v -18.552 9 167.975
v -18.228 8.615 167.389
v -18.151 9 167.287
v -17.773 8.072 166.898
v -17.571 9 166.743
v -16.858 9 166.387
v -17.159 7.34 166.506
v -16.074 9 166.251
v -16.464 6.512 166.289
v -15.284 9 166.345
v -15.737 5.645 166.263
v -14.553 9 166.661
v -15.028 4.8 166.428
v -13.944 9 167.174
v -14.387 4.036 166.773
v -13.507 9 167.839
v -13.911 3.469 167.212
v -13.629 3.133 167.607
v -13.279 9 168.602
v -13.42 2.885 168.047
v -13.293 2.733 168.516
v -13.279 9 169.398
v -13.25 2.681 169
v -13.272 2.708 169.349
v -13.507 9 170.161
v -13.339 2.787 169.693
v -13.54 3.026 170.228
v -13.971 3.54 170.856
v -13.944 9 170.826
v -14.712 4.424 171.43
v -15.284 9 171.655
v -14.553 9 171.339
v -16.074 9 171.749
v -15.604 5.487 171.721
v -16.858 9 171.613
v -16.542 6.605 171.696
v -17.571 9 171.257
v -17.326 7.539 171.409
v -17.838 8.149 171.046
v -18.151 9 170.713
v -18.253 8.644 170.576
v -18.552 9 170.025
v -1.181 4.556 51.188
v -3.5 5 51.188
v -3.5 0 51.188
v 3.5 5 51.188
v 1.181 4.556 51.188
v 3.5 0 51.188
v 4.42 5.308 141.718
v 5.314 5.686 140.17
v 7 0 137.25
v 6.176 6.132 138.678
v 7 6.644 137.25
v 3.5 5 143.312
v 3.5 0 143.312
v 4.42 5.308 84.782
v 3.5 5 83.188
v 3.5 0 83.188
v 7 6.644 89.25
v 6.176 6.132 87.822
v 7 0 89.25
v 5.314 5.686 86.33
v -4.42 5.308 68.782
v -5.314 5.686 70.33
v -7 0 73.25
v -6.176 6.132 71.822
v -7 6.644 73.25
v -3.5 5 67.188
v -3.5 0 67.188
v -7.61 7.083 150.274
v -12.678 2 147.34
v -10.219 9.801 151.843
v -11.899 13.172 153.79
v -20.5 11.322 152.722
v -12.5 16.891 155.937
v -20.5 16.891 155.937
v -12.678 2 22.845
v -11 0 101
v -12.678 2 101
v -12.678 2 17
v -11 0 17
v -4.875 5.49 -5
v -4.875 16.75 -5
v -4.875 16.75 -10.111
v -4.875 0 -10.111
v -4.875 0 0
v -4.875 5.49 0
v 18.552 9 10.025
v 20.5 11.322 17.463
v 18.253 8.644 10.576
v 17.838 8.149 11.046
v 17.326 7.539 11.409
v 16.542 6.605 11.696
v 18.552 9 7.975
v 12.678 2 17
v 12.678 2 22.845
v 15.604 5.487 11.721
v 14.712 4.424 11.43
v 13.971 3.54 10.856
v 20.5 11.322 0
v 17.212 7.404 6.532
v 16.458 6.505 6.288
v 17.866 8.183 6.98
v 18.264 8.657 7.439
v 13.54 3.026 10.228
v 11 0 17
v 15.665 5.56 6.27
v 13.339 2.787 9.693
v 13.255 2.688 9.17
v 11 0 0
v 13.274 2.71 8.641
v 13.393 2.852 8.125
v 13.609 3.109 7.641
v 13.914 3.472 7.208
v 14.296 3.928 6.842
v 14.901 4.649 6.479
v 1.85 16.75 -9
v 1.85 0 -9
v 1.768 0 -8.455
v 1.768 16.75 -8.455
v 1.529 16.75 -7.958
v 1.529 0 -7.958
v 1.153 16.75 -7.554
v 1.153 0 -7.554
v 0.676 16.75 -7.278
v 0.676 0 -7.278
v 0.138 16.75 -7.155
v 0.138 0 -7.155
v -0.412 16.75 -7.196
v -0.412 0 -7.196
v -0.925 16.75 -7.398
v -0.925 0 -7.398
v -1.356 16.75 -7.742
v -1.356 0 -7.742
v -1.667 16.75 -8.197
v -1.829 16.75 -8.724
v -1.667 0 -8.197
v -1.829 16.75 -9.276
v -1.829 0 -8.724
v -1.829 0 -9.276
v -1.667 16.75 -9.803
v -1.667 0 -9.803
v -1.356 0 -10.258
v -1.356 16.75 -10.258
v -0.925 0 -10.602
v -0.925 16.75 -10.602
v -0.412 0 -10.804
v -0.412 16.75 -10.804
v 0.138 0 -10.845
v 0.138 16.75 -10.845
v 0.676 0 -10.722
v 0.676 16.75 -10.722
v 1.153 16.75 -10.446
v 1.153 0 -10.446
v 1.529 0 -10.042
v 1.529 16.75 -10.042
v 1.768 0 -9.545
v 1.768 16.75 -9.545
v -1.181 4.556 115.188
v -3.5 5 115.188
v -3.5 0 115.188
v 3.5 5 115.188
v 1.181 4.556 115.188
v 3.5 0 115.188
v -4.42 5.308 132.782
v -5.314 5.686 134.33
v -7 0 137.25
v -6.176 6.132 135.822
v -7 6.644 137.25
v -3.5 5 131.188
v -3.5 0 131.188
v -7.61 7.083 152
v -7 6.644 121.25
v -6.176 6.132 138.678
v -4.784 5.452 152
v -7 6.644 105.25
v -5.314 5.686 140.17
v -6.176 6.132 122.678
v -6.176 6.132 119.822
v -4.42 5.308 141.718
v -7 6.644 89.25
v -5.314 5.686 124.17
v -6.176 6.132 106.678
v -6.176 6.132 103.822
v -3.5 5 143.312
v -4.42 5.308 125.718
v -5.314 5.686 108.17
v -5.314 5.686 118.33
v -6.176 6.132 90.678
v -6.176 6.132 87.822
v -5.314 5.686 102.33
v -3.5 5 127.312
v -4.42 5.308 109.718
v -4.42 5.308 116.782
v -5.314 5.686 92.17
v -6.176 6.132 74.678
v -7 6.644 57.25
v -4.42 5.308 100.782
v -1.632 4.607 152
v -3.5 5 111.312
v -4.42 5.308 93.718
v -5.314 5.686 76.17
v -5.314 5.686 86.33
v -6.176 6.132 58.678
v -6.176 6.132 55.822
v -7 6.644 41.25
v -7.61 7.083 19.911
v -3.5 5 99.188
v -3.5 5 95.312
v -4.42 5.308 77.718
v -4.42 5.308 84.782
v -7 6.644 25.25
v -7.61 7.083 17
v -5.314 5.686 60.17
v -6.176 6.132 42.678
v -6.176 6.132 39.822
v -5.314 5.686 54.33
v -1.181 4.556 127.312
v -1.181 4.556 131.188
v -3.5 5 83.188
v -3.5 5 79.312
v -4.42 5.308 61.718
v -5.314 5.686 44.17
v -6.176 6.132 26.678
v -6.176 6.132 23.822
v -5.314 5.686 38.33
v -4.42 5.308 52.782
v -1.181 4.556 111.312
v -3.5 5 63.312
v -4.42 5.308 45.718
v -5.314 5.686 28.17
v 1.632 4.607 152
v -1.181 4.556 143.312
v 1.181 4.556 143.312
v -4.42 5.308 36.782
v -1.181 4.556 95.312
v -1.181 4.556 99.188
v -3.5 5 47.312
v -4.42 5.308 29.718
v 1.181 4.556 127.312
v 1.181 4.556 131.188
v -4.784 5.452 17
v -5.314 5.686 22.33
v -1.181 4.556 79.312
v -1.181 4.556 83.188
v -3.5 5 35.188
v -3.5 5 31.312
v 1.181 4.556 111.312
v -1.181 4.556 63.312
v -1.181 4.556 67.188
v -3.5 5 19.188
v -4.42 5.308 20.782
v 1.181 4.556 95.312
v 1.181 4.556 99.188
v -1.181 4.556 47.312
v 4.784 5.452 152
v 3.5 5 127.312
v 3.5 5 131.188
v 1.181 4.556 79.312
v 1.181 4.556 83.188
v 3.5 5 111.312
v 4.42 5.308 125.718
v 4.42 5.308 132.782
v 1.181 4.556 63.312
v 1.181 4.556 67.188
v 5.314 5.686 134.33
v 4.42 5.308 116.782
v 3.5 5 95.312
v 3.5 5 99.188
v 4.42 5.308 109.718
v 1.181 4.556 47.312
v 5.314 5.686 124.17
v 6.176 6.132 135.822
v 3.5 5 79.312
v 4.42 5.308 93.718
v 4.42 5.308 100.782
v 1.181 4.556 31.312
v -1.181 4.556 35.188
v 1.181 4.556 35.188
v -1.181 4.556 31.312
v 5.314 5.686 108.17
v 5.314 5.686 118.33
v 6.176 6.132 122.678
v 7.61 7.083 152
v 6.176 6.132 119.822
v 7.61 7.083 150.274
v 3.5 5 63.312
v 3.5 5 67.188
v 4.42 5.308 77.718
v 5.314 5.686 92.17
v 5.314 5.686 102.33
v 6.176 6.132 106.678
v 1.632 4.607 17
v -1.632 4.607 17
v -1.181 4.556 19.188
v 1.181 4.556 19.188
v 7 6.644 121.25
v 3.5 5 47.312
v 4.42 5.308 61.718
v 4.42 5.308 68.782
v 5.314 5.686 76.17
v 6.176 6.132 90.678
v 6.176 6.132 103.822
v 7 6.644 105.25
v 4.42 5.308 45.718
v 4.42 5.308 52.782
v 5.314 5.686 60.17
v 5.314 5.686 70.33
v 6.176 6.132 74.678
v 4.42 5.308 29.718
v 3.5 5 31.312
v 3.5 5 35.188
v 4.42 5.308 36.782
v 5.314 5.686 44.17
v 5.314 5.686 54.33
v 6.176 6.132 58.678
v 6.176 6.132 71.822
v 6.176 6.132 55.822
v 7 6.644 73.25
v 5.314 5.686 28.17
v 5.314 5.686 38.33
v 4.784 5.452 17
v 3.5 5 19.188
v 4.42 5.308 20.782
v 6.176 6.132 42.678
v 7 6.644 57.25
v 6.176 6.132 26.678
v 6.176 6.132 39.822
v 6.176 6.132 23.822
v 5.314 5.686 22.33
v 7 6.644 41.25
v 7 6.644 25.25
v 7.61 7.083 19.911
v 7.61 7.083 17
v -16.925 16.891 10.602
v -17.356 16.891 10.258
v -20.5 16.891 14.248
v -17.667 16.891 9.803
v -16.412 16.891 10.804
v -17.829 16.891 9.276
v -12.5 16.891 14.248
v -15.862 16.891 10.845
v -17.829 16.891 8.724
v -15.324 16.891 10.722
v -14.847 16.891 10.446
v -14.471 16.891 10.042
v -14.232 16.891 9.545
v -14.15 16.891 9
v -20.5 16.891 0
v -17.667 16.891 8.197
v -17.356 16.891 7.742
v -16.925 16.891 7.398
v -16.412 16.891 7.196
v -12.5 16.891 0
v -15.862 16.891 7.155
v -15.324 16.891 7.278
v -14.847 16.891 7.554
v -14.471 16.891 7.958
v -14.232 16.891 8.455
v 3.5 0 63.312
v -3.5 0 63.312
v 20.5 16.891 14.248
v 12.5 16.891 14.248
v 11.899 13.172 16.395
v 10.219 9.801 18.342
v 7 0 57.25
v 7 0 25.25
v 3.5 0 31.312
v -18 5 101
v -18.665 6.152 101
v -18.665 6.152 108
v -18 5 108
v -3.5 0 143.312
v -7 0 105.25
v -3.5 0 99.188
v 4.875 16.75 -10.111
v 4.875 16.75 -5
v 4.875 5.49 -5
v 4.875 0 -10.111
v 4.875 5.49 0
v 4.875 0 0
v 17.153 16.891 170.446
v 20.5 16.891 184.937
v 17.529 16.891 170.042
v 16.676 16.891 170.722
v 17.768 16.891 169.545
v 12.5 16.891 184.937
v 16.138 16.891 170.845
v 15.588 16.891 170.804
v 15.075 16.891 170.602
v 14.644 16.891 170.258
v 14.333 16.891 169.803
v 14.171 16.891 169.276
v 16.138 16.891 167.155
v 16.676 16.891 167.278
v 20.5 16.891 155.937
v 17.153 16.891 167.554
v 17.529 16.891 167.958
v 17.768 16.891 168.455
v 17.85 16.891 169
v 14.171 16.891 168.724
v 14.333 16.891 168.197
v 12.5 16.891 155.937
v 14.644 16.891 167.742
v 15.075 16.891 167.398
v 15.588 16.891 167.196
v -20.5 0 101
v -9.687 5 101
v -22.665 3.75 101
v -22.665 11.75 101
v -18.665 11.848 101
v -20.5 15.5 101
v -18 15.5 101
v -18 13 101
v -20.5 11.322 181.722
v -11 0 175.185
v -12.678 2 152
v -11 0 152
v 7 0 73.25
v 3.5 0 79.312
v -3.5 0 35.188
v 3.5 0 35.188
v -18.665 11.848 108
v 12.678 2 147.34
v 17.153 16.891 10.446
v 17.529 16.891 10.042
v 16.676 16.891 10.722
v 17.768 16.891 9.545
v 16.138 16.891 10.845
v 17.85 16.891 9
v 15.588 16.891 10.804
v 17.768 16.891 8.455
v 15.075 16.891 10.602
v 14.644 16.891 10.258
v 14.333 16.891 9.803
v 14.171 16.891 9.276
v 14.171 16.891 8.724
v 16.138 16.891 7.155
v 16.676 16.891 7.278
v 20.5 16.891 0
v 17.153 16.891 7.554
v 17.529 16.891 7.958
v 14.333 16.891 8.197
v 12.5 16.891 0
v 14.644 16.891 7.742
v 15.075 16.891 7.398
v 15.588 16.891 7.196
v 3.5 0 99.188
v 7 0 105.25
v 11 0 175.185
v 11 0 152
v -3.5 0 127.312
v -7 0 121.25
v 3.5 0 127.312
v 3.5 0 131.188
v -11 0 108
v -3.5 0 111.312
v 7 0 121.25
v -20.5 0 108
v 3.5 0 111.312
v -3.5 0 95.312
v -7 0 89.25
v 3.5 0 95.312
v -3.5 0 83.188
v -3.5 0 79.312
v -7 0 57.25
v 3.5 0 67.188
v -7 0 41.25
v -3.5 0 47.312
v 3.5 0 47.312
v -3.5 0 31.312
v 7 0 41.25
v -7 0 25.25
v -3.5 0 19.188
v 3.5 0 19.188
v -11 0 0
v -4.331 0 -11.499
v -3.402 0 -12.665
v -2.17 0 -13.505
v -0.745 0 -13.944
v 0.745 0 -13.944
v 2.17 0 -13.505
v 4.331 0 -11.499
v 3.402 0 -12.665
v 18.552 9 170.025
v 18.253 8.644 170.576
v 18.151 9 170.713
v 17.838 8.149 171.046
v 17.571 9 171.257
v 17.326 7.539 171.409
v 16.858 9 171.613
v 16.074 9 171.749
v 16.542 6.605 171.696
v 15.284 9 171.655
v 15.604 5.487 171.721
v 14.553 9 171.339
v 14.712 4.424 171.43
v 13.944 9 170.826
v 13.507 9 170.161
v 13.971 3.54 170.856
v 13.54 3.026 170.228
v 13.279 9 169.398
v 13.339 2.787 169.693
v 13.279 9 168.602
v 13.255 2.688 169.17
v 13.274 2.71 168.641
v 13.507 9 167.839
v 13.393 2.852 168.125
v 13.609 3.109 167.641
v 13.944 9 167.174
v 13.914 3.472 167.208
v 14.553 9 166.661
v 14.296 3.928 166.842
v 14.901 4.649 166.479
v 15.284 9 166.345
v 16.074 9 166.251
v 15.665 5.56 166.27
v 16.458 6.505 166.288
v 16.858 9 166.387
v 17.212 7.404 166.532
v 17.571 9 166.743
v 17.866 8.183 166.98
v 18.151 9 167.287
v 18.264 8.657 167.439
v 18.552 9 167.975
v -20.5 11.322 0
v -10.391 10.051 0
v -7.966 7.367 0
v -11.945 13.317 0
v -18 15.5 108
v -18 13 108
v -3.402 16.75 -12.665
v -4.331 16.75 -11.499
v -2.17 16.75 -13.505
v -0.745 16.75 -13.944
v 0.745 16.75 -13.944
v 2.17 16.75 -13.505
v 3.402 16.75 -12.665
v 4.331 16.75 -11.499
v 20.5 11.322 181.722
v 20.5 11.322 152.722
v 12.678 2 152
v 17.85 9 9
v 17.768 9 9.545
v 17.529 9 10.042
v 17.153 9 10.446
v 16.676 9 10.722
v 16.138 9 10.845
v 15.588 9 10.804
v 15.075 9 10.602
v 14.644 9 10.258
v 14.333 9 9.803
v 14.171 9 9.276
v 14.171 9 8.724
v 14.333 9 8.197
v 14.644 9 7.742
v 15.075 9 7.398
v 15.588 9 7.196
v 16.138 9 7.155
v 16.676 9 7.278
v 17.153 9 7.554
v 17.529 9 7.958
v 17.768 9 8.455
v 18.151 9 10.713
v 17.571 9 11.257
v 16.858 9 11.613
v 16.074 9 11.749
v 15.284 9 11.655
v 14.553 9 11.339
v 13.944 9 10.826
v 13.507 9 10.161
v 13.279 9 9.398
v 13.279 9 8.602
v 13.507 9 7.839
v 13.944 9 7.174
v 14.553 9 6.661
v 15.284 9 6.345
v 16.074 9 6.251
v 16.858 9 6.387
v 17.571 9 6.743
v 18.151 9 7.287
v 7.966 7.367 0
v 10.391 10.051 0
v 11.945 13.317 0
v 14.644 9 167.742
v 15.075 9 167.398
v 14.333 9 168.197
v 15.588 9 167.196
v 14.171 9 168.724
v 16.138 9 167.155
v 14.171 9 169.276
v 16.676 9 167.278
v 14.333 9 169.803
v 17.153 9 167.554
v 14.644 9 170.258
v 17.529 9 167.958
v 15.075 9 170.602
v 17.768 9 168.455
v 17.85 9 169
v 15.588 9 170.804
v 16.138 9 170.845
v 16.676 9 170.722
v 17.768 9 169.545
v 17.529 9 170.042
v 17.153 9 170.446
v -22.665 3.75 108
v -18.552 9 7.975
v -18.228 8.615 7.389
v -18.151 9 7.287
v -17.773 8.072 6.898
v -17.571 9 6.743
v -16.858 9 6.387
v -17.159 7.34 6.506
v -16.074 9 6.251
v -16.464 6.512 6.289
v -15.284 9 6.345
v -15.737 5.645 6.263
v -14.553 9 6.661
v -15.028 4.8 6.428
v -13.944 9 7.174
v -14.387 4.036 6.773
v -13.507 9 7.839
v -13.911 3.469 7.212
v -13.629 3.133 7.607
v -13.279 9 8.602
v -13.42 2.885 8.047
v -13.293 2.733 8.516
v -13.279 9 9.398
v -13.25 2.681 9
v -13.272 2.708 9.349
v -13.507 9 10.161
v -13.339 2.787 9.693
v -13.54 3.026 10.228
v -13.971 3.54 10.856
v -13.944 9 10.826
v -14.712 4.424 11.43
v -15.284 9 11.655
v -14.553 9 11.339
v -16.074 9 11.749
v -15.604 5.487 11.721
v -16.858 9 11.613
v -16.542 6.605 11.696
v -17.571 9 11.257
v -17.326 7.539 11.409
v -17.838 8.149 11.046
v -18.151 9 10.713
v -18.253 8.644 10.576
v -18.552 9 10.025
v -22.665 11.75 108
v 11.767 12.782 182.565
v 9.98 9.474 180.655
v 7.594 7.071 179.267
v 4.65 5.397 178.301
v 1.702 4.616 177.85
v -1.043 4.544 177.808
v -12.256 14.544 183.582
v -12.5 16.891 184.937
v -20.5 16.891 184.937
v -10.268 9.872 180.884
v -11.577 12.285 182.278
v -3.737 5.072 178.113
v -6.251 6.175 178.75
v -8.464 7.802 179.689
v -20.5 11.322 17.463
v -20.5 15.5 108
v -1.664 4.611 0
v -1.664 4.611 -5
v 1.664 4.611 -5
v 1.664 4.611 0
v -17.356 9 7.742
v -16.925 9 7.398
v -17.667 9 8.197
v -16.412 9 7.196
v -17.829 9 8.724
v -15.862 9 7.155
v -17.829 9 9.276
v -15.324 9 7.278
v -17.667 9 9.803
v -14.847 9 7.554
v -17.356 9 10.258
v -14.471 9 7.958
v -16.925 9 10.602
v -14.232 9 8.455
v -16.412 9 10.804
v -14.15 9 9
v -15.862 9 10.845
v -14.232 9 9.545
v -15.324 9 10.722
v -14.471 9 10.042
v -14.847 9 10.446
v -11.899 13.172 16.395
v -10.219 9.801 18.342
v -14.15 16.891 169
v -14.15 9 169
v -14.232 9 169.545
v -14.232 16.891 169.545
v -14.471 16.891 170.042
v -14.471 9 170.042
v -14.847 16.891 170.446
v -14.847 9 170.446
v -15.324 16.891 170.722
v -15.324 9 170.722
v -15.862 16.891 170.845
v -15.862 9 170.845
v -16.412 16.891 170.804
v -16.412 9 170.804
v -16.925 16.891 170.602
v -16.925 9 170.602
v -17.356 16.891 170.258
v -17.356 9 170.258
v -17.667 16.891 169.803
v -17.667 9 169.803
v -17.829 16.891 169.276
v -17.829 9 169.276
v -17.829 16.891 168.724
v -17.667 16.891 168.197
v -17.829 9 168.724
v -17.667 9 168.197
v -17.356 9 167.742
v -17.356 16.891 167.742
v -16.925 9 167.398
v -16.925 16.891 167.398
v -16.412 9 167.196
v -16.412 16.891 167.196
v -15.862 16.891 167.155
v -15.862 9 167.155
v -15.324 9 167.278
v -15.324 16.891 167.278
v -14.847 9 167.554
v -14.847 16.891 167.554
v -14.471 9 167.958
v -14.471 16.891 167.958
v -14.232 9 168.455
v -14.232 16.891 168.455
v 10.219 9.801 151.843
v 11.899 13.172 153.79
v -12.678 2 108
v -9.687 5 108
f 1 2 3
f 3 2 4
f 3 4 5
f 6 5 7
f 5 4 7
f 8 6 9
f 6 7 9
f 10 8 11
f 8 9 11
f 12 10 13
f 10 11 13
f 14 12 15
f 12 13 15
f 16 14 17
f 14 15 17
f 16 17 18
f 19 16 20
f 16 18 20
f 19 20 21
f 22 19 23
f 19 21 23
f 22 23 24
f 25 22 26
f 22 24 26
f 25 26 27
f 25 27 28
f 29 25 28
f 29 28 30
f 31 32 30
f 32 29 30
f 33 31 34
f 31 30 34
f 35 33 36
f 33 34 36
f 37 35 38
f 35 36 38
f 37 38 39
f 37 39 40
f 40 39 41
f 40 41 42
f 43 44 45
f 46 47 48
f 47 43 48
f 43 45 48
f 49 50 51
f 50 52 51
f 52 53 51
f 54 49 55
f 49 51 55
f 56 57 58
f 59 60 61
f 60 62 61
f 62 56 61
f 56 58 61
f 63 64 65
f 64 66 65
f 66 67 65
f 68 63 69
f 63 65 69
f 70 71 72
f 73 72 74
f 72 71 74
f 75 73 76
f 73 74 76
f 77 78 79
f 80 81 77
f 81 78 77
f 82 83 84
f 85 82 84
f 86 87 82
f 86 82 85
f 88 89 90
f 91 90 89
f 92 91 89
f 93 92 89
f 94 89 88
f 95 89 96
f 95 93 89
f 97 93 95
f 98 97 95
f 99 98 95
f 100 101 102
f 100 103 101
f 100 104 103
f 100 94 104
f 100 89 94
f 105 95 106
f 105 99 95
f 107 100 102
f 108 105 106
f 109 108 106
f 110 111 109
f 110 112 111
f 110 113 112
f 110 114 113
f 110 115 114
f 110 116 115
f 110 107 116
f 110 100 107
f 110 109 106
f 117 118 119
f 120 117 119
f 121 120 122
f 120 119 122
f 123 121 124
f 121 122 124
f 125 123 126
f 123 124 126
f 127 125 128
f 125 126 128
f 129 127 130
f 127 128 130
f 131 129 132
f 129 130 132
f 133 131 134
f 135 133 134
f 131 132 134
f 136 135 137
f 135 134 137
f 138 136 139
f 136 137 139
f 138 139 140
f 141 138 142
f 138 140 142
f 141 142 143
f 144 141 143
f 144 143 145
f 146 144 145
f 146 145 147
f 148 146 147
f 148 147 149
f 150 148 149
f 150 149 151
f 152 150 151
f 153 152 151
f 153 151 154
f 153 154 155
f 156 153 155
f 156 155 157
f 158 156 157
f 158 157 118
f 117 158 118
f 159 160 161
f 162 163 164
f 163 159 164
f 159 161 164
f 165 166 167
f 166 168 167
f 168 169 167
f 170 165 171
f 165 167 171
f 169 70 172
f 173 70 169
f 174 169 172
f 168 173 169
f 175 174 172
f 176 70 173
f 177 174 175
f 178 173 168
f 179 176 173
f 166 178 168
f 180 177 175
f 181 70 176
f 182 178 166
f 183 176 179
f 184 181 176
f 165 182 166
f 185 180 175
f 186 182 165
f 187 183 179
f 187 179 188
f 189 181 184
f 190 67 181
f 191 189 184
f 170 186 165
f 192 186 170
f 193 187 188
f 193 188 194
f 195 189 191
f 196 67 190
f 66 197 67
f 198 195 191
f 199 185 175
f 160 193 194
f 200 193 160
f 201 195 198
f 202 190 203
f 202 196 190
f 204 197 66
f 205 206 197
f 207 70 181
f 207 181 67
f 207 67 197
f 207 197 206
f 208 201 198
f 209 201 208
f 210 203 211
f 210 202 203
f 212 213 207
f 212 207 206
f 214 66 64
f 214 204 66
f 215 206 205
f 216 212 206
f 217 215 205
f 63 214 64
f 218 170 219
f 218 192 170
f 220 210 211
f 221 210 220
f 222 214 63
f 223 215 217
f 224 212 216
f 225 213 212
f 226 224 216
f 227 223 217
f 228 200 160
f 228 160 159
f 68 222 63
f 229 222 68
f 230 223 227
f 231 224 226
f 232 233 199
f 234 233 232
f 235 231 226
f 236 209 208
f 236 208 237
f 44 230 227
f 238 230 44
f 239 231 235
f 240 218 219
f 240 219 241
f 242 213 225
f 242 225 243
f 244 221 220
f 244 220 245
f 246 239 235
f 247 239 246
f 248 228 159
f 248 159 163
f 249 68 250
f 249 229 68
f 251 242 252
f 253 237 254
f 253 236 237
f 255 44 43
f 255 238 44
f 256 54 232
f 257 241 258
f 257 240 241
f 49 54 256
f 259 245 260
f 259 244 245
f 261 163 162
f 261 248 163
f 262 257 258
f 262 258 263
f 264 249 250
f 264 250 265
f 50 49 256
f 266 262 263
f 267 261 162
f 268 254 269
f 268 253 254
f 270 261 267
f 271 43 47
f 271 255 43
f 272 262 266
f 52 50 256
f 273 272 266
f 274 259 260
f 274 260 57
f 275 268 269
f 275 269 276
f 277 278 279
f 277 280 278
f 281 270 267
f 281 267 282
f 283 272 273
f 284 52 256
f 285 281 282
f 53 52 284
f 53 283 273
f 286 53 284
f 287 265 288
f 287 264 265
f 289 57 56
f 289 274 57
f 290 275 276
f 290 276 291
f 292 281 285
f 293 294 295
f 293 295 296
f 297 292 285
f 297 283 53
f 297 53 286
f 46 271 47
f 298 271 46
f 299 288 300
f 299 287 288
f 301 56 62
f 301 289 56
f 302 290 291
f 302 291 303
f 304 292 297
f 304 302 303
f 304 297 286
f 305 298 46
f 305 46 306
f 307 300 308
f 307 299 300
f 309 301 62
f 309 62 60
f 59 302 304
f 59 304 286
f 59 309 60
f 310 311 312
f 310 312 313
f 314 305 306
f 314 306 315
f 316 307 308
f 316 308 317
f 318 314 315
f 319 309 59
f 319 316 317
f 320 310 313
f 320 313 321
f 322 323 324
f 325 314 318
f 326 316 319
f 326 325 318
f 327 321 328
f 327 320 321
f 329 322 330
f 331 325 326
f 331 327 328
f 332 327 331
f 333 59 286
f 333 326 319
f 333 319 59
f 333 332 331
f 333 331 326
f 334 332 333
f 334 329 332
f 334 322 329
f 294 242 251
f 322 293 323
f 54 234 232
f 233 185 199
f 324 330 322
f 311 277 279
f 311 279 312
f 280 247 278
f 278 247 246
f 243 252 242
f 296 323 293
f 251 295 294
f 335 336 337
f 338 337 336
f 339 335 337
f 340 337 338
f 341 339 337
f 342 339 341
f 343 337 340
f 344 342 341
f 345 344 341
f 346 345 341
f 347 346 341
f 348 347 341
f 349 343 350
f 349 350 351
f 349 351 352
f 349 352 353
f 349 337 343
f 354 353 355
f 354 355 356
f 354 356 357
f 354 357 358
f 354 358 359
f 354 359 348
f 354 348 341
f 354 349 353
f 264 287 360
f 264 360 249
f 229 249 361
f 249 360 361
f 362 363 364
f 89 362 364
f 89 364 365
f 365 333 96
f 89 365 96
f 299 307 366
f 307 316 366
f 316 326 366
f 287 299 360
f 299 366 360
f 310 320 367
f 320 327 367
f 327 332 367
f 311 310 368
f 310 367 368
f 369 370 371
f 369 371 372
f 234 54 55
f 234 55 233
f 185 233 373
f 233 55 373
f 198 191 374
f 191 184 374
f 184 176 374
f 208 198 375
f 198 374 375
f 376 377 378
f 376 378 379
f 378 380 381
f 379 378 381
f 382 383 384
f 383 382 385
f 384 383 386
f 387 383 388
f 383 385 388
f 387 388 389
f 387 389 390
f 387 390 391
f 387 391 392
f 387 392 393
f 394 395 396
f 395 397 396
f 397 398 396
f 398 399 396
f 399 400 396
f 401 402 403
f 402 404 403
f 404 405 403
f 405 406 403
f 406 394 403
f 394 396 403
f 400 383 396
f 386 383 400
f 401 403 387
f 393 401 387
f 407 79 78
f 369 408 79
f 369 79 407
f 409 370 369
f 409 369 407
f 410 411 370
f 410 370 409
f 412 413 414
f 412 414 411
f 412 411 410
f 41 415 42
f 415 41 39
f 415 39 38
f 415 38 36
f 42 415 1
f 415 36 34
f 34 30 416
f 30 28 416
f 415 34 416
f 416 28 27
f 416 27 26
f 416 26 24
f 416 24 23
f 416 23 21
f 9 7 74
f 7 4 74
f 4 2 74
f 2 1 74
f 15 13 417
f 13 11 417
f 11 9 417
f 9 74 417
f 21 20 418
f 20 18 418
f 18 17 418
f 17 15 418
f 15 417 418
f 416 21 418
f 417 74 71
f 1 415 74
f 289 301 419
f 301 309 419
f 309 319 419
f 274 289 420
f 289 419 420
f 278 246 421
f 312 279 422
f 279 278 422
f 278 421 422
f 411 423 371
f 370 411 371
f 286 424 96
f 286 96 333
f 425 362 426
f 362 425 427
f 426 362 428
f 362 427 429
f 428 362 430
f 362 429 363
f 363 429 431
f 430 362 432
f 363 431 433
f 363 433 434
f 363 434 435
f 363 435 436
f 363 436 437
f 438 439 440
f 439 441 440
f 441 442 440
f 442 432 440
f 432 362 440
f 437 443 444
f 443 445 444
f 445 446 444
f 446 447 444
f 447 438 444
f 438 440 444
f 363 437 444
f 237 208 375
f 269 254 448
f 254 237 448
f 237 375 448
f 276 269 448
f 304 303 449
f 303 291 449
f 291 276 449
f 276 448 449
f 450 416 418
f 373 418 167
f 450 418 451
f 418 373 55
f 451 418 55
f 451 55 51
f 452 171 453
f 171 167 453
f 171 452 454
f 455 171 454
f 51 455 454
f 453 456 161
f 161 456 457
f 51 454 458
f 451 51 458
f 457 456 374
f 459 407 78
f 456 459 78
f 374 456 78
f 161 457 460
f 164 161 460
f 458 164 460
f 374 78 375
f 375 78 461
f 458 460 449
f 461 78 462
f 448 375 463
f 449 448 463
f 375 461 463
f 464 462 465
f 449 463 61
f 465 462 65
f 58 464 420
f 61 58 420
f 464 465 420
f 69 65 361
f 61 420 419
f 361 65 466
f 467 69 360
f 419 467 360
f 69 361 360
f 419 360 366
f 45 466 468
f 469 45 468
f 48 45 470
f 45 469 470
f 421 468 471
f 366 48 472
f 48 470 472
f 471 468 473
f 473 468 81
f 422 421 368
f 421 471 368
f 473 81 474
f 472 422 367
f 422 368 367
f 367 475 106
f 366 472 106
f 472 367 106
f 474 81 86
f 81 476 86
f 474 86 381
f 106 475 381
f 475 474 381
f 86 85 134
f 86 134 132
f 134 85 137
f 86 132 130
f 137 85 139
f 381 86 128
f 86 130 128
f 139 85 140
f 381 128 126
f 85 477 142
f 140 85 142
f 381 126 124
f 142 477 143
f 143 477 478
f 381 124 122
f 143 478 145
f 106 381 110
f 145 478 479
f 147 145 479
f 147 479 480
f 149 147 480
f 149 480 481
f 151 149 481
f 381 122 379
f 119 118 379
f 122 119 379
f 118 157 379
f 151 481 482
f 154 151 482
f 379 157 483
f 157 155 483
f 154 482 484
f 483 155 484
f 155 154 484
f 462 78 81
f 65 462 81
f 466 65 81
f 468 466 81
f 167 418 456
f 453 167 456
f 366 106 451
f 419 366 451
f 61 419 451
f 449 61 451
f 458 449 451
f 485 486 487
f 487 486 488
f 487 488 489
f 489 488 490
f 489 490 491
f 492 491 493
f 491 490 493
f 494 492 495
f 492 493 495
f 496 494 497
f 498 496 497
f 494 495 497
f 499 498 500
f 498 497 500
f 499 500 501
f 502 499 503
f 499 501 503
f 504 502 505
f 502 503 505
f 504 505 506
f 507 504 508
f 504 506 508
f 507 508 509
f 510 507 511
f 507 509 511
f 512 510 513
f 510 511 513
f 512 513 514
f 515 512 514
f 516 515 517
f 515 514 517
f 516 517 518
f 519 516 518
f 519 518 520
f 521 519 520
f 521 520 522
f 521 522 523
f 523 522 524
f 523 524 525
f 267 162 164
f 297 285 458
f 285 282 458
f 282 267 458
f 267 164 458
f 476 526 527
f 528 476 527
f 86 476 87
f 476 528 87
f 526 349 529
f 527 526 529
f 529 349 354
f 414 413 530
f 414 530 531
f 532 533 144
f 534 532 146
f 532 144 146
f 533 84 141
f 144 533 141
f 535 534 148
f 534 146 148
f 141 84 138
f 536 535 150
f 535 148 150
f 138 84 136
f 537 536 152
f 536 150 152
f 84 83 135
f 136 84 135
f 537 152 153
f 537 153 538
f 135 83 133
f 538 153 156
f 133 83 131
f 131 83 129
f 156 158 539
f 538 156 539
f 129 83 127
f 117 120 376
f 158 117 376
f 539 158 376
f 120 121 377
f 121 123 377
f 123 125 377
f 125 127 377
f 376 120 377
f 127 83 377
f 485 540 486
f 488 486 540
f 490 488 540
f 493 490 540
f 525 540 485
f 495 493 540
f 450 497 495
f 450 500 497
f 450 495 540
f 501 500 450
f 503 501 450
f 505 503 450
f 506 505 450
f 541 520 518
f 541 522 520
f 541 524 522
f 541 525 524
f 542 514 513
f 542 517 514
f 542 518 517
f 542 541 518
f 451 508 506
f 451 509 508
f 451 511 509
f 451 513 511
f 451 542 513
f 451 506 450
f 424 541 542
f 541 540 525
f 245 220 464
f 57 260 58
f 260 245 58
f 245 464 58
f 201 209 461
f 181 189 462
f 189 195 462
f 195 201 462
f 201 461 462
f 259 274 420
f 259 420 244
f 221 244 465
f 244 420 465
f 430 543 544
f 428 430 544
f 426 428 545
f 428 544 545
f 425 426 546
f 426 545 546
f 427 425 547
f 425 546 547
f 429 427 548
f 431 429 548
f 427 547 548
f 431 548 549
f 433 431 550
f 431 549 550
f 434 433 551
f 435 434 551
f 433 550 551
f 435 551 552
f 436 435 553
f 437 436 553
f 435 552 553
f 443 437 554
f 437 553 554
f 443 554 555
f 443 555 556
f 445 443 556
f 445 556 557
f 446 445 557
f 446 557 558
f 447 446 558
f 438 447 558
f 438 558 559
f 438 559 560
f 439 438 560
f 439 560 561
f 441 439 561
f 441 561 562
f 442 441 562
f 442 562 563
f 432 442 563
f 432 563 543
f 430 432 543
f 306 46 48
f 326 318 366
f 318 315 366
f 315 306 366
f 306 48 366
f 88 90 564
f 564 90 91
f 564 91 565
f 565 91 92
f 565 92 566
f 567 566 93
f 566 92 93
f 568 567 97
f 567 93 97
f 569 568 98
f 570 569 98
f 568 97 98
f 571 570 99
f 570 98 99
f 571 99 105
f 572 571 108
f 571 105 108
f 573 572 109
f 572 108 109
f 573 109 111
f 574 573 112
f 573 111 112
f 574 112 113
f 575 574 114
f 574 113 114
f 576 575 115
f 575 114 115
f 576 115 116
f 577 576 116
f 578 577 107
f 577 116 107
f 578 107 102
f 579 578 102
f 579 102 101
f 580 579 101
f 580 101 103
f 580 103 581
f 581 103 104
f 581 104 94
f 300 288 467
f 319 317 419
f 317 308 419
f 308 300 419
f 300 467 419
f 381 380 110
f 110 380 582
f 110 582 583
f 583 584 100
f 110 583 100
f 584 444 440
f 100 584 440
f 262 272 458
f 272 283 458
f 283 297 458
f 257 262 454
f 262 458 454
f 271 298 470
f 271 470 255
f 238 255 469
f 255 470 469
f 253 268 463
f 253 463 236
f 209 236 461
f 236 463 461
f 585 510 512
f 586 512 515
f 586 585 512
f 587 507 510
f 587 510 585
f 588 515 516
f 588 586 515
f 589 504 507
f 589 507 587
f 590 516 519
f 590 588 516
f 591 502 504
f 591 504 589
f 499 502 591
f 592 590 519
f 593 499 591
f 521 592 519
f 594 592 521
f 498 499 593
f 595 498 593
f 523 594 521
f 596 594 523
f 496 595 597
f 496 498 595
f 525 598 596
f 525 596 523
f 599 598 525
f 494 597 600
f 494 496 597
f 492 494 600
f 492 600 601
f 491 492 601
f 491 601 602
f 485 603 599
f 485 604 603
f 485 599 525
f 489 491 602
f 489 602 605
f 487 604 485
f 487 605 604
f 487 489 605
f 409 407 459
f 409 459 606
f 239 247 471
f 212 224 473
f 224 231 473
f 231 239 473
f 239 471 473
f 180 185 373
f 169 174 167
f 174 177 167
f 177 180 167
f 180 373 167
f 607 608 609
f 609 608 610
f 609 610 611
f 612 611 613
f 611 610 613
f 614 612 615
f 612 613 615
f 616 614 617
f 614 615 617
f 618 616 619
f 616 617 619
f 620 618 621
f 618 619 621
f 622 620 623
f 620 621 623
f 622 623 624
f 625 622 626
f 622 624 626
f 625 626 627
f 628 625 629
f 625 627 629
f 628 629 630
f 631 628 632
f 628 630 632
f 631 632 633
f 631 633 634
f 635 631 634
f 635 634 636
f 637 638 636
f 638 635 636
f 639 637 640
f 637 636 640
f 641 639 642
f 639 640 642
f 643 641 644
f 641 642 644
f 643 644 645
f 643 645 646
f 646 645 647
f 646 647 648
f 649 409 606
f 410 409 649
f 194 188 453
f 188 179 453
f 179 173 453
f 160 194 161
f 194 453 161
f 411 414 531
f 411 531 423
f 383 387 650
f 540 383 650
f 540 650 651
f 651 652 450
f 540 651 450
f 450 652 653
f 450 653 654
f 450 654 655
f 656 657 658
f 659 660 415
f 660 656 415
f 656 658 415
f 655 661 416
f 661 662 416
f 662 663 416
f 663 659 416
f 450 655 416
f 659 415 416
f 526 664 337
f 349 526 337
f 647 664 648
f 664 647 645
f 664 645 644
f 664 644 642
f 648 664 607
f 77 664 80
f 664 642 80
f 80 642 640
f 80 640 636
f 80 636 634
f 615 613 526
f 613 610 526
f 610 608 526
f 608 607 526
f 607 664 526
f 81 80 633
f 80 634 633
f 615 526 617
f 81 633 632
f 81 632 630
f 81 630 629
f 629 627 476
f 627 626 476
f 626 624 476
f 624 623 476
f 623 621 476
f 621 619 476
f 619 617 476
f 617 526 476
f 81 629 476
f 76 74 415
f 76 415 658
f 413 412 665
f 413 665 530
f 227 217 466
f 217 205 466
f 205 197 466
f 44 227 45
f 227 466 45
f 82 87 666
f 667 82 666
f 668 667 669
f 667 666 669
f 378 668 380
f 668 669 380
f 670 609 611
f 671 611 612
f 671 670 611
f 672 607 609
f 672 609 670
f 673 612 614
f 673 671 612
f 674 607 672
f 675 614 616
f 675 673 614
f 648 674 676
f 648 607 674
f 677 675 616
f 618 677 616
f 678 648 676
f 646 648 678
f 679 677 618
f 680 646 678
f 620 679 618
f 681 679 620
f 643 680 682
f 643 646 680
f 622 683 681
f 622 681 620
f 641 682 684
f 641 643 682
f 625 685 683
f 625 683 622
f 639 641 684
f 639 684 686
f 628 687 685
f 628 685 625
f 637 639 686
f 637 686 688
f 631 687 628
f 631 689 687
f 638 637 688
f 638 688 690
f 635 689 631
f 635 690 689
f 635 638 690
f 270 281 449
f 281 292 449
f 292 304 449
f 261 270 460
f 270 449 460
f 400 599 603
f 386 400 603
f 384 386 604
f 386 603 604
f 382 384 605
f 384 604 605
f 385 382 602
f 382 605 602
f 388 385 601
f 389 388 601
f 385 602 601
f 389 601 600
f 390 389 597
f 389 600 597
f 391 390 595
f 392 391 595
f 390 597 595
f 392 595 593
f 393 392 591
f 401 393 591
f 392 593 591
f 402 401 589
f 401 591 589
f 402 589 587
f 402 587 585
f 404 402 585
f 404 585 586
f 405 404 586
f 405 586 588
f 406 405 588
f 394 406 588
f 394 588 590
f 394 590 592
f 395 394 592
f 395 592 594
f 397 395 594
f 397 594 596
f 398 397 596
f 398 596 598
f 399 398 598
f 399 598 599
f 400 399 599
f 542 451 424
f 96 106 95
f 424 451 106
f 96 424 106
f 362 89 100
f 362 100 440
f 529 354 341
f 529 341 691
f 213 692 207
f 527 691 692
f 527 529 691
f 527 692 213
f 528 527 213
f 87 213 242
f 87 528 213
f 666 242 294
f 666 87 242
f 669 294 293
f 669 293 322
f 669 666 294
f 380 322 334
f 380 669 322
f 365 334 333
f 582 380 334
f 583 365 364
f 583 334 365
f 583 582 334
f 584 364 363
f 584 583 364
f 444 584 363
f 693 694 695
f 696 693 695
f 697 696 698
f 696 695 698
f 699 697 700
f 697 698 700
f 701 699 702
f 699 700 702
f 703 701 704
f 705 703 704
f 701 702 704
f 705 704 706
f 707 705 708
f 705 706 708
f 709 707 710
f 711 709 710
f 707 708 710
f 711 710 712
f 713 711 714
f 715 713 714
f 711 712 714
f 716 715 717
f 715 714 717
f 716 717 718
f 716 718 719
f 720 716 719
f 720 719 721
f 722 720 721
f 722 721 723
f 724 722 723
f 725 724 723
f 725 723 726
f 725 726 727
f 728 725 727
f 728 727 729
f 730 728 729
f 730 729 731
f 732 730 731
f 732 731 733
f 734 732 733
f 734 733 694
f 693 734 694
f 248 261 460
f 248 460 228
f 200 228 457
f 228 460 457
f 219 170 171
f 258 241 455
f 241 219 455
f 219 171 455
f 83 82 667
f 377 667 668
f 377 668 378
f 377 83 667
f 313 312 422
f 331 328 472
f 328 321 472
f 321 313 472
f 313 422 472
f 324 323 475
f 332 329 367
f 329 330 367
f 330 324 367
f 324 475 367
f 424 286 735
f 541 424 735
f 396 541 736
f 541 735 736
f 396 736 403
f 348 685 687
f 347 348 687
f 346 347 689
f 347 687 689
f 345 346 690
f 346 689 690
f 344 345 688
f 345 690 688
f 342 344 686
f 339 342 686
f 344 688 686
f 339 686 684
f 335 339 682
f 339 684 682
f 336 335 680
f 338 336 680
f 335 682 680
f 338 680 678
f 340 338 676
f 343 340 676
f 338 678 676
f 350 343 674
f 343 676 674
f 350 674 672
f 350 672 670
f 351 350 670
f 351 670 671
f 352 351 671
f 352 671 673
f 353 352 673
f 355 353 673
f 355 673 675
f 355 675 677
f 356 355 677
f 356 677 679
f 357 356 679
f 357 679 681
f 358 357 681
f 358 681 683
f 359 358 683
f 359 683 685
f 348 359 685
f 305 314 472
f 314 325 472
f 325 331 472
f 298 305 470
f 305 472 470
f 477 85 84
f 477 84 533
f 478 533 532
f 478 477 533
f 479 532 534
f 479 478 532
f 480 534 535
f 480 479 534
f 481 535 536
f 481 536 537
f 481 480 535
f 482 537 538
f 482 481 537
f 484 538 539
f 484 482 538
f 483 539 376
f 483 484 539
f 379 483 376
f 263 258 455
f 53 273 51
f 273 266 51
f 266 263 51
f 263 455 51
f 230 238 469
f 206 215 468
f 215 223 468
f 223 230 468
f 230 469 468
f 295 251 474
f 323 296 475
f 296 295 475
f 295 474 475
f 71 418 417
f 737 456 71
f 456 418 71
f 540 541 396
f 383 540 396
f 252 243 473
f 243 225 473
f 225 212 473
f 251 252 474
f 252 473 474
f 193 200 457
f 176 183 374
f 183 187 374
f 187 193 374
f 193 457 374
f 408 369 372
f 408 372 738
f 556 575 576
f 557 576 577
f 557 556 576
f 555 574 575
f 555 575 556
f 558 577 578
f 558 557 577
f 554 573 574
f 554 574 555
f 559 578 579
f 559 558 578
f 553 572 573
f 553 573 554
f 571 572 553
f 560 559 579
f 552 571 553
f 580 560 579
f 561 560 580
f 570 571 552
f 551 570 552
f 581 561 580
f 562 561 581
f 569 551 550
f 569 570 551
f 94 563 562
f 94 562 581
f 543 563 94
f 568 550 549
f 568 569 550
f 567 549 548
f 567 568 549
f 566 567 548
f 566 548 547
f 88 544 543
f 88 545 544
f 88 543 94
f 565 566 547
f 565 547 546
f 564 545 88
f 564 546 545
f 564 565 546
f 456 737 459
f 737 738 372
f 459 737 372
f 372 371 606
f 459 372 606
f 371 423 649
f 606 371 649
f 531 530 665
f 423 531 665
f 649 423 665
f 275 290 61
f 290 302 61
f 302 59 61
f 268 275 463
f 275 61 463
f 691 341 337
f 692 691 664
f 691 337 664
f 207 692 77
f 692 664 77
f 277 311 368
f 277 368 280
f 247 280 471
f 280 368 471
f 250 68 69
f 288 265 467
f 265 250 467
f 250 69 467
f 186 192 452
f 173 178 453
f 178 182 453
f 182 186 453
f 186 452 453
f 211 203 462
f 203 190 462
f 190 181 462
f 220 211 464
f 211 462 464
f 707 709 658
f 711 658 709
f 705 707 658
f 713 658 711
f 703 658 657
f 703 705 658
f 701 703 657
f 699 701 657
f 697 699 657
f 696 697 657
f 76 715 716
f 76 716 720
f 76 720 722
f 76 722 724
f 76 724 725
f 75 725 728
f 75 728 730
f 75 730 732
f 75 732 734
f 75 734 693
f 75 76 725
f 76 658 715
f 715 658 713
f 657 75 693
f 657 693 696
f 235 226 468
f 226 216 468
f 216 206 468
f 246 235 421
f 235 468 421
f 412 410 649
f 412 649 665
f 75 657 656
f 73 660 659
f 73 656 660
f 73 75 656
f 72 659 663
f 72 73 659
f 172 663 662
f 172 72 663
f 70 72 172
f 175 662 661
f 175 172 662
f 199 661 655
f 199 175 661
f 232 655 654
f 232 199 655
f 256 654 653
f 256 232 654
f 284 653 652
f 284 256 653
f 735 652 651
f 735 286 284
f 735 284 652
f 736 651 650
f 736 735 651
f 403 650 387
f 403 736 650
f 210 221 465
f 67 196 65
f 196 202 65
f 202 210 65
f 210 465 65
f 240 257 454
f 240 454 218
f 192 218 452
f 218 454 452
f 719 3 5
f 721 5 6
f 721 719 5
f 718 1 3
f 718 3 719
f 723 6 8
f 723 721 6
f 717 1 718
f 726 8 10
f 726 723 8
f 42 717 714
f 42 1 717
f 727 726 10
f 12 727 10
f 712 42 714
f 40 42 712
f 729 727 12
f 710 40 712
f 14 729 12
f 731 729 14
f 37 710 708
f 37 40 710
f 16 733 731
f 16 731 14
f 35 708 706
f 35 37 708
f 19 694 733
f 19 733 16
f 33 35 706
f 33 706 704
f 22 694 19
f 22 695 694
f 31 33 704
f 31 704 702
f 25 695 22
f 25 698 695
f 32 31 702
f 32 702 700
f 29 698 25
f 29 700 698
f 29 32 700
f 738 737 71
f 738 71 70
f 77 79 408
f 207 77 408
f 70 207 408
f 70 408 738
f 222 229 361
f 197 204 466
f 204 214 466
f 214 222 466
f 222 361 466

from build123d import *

# Parameters (mm, degrees)
SKETCH242_AS_DRAWN_R                    = 1.85
EXTRUDE136028_DEPTH                     = 20
EXTRUDE136028_ONTO_SKETCH242_ROLL_ANGLE = 90
EXTRUDE136035_DEPTH                     = 50
SKETCH245_AS_DRAWN_R                    = 2.75
EXTRUDE136031_DEPTH                     = 9
EXTRUDE136031_ONTO_SKETCH245_ROLL_ANGLE = 90
SKETCH244_AS_DRAWN_R                    = 1.85
EXTRUDE136030_DEPTH                     = 20
EXTRUDE136030_ONTO_SKETCH244_ROLL_ANGLE = 90
EXTRUDE136029_DEPTH                     = 38
EXTRUDE136036_DEPTH                     = 50
SKETCH248_AS_DRAWN_R                    = 2.75
EXTRUDE136034_DEPTH                     = 9
EXTRUDE136034_ONTO_SKETCH248_ROLL_ANGLE = 90
SKETCH247_AS_DRAWN_R                    = 1.85
EXTRUDE136033_DEPTH                     = 20
EXTRUDE136033_ONTO_SKETCH247_ROLL_ANGLE = 90
EXTRUDE136032_DEPTH                     = 24
EXTRUDE136037_DEPTH                     = 14
SKETCH252_W                             = 9.75
SKETCH252_H                             = 16.75
EXTRUDE136038_DEPTH                     = 9
EXTRUDE136039_DEPTH                     = 7
EXTRUDE136027_DEPTH                     = 135


with BuildPart() as extrude136028:
    # Sketch242 as drawn → Extrude136028 (new)
    with BuildSketch(Plane.XY):
        with Locations((0, -9)):
            Circle(SKETCH242_AS_DRAWN_R)
        Polygon((3.5, 19.187822), (7, 25.25), (3.5, 31.312178), (-3.5, 31.312178), (-7, 25.25), (-3.5, 19.187822), align=None)
        Polygon((3.5, 35.187822), (7, 41.25), (3.5, 47.312178), (-3.5, 47.312178), (-7, 41.25), (-3.5, 35.187822), align=None)
        Polygon((3.5, 51.187822), (7, 57.25), (3.5, 63.312178), (-3.5, 63.312178), (-7, 57.25), (-3.5, 51.187822), align=None)
        Polygon((3.5, 67.187822), (7, 73.25), (3.5, 79.312178), (-3.5, 79.312178), (-7, 73.25), (-3.5, 67.187822), align=None)
        Polygon((3.5, 83.187822), (7, 89.25), (3.5, 95.312178), (-3.5, 95.312178), (-7, 89.25), (-3.5, 83.187822), align=None)
        Polygon((3.5, 99.187822), (7, 105.25), (3.5, 111.312178), (-3.5, 111.312178), (-7, 105.25), (-3.5, 99.187822), align=None)
        Polygon((3.5, 115.187822), (7, 121.25), (3.5, 127.312178), (-3.5, 127.312178), (-7, 121.25), (-3.5, 115.187822), align=None)
        Polygon((3.5, 131.187822), (7, 137.25), (3.5, 143.312178), (-3.5, 143.312178), (-7, 137.25), (-3.5, 131.187822), align=None)
        with BuildLine():
            Line((5, -8.999981), (5, -15.999981))
            Line((5, -15.999981), (-5, -15.999981))
            Line((-5, -15.999981), (-5, -8.999981))
            ThreePointArc((-5, -8.999981), (0, -14), (5, -8.999981))
        make_face()
    extrude(amount=-EXTRUDE136028_DEPTH)


with BuildPart() as extrude136028_1:
    # Extrude136028 onto Sketch242 roll: moved
    add(extrude136028.part.rotate(Axis((0, 0, 0), (1, 0, 0)), EXTRUDE136028_ONTO_SKETCH242_ROLL_ANGLE))


with BuildPart() as extrude136028_2:
    # Extrude136028 onto Sketch242 placement: moved
    add(extrude136028_1.part)


with BuildPart() as extrude136035:
    # Sketch249 → Extrude136035 (new body)
    with BuildSketch(Plane.YZ):
        Polygon((0, -9.814955), (17, 0), (17, -9.814955), align=None)
        Polygon((17, 29), (0, 19.185045), (0, 29), align=None)
    extrude(amount=EXTRUDE136035_DEPTH)


with BuildPart() as extrude136035_1:
    # Extrude136035 placement: moved
    add(extrude136035.part.moved(Location((-25, 0, 0))))


with BuildPart() as extrude136031:
    # Sketch245 as drawn → Extrude136031 (new)
    with BuildSketch(Plane.XY):
        with Locations((-16, 0)):
            Circle(SKETCH245_AS_DRAWN_R)
        with Locations((16, 0)):
            Circle(SKETCH245_AS_DRAWN_R)
    extrude(amount=-EXTRUDE136031_DEPTH)


with BuildPart() as extrude136031_1:
    # Extrude136031 onto Sketch245 roll: moved
    add(extrude136031.part.rotate(Axis((0, 0, 0), (1, 0, 0)), EXTRUDE136031_ONTO_SKETCH245_ROLL_ANGLE))


with BuildPart() as extrude136031_2:
    # Extrude136031 onto Sketch245 placement: moved
    add(extrude136031_1.part)


with BuildPart() as fusion034004041043:
    # Sketch244 as drawn → Extrude136030 (new)
    with BuildSketch(Plane.XY):
        with Locations((-16, 0)):
            Circle(SKETCH244_AS_DRAWN_R)
        with Locations((16, 0)):
            Circle(SKETCH244_AS_DRAWN_R)
    extrude(amount=-EXTRUDE136030_DEPTH)


with BuildPart() as fusion034004041043_1:
    # Extrude136030 onto Sketch244 roll: moved
    add(fusion034004041043.part.rotate(Axis((0, 0, 0), (1, 0, 0)), EXTRUDE136030_ONTO_SKETCH244_ROLL_ANGLE))


with BuildPart() as fusion034004041043_2:
    # Extrude136030 onto Sketch244 placement: moved
    add(fusion034004041043_1.part)

    # Fusion034004041041: union Extrude136031
    add(extrude136031_2.part)


with BuildPart() as fusion034004041043_3:
    # Fusion034004041041 placement: moved
    add(fusion034004041043_2.part.moved(Location((0, 0, 13))))

    # Fusion034004041043: union Extrude136035
    add(extrude136035_1.part)


with BuildPart() as cut009010006006006005003:
    # Sketch243 → Extrude136029 (new body)
    with BuildSketch(Plane.XY):
        with BuildLine():
            Line((-11, 0), (11, 0))
            Line((20.5, 11.321659), (11, 0))
            Line((20.5, 11.321659), (20.5, 16.890918))
            Line((20.5, 16.890918), (12.499524, 16.890918))
            ThreePointArc((-12.499524, 16.890918), (0, 4.5), (12.499524, 16.890918))
            Line((-20.5, 16.890918), (-12.499524, 16.890918))
            Line((-20.5, 11.321659), (-20.5, 16.890918))
            Line((-20.5, 11.321659), (-11, 0))
        make_face()
    extrude(amount=EXTRUDE136029_DEPTH)


with BuildPart() as cut009010006006006005003_1:
    # Extrude136029 placement: moved
    add(cut009010006006006005003.part.moved(Location((0, 0, -9))))

    # Cut009010006006006005003: cut Fusion034004041043
    add(fusion034004041043_3.part, mode=Mode.SUBTRACT)


with BuildPart() as cut009010006006006005003_2:
    # Cut009010006006006005003 placement: moved
    add(cut009010006006006005003_1.part.moved(Location((0, 0, 156))))


with BuildPart() as extrude136036:
    # Sketch250 → Extrude136036 (new body)
    with BuildSketch(Plane.YZ):
        Polygon((0, 24), (17, 24), (17, 14.185045), align=None)
    extrude(amount=EXTRUDE136036_DEPTH)


with BuildPart() as extrude136036_1:
    # Extrude136036 placement: moved
    add(extrude136036.part.moved(Location((-25, 0, 0))))


with BuildPart() as extrude136034:
    # Sketch248 as drawn → Extrude136034 (new)
    with BuildSketch(Plane.XY):
        with Locations((-16, 0)):
            Circle(SKETCH248_AS_DRAWN_R)
        with Locations((16, 0)):
            Circle(SKETCH248_AS_DRAWN_R)
    extrude(amount=-EXTRUDE136034_DEPTH)


with BuildPart() as extrude136034_1:
    # Extrude136034 onto Sketch248 roll: moved
    add(extrude136034.part.rotate(Axis((0, 0, 0), (1, 0, 0)), EXTRUDE136034_ONTO_SKETCH248_ROLL_ANGLE))


with BuildPart() as extrude136034_2:
    # Extrude136034 onto Sketch248 placement: moved
    add(extrude136034_1.part)


with BuildPart() as fusion034004041042:
    # Sketch247 as drawn → Extrude136033 (new)
    with BuildSketch(Plane.XY):
        with Locations((-16, 0)):
            Circle(SKETCH247_AS_DRAWN_R)
        with Locations((16, 0)):
            Circle(SKETCH247_AS_DRAWN_R)
    extrude(amount=-EXTRUDE136033_DEPTH)


with BuildPart() as fusion034004041042_1:
    # Extrude136033 onto Sketch247 roll: moved
    add(fusion034004041042.part.rotate(Axis((0, 0, 0), (1, 0, 0)), EXTRUDE136033_ONTO_SKETCH247_ROLL_ANGLE))


with BuildPart() as fusion034004041042_2:
    # Extrude136033 onto Sketch247 placement: moved
    add(fusion034004041042_1.part)

    # Fusion034004041042: union Extrude136034
    add(extrude136034_2.part)


with BuildPart() as fusion034004041042_3:
    # Fusion034004041042 placement: moved
    add(fusion034004041042_2.part.moved(Location((0, 0, 9))))


with BuildPart() as cut009010006006006005004:
    # Sketch246 → Extrude136032 (new body)
    with BuildSketch(Plane.XY):
        with BuildLine():
            Line((-11, 0), (11, 0))
            Line((20.5, 11.321659), (11, 0))
            Line((20.5, 11.321659), (20.5, 16.890918))
            Line((20.5, 16.890918), (12.499524, 16.890918))
            ThreePointArc((-12.499524, 16.890918), (0, 4.5), (12.499524, 16.890918))
            Line((-20.5, 16.890918), (-12.499524, 16.890918))
            Line((-20.5, 11.321659), (-20.5, 16.890918))
            Line((-20.5, 11.321659), (-11, 0))
        make_face()
    extrude(amount=EXTRUDE136032_DEPTH)

    # Cut009010006006006005002: cut Fusion034004041042
    add(fusion034004041042_3.part, mode=Mode.SUBTRACT)

    # Cut009010006006006005004: cut Extrude136036
    add(extrude136036_1.part, mode=Mode.SUBTRACT)


with BuildPart() as extrude136037:
    # Sketch251 → Extrude136037 (new body)
    with BuildSketch(Plane.XY):
        with BuildLine():
            Line((-4.875, 0), (4.875, 0))
            Line((4.875, 5.489814), (4.875, 0))
            ThreePointArc((-4.875, 5.489814), (0, 4.5), (4.875, 5.489814))
            Line((-4.875, 5.489814), (-4.875, 0))
        make_face()
    extrude(amount=-EXTRUDE136037_DEPTH)


with BuildPart() as extrude136038:
    # Sketch252 → Extrude136038 (new body)
    with BuildSketch(Plane.XY):
        with Locations((0, 8.375)):
            Rectangle(SKETCH252_W, SKETCH252_H)
    extrude(amount=-EXTRUDE136038_DEPTH)


with BuildPart() as extrude136038_1:
    # Extrude136038 placement: moved
    add(extrude136038.part.moved(Location((0, 0, -5))))


with BuildPart() as extrude136039:
    # Sketch253 → Extrude136039 (new body)
    with BuildSketch(Plane.XY):
        Polygon((0, 5), (0, 0), (-20.5, 0), (-22.665064, 3.75), (-22.665064, 11.75), (-20.5, 15.5), (-18, 15.5), (-18, 13), (-18.665064, 11.848076), (-18.665064, 6.151924), (-18, 5), align=None)
    extrude(amount=EXTRUDE136039_DEPTH)


with BuildPart() as extrude136039_1:
    # Extrude136039 placement: moved
    add(extrude136039.part.moved(Location((0, 0, 101))))


with BuildPart() as cut009010006006006005005:
    # Sketch241 → Extrude136027 (new body)
    with BuildSketch(Plane.XY):
        with BuildLine():
            Line((-11, 0), (11, 0))
            Line((11, 0), (12.678199, 2))
            Line((12.678199, 2), (7.609518, 7.083083))
            ThreePointArc((-7.609518, 7.083083), (0, 4.5), (7.609518, 7.083083))
            Line((-12.678199, 2), (-7.609518, 7.083083))
            Line((-11, 0), (-12.678199, 2))
        make_face()
    extrude(amount=EXTRUDE136027_DEPTH)


with BuildPart() as cut009010006006006005005_1:
    # Extrude136027 placement: moved
    add(cut009010006006006005005.part.moved(Location((0, 0, 17))))

    # Fusion034004041027: union Cut009010006006006005003, Cut009010006006006005004, Extrude136037, Extrude136038, Extrude136039
    add(cut009010006006006005003_2.part)
    add(cut009010006006006005004.part)
    add(extrude136037.part)
    add(extrude136038_1.part)
    add(extrude136039_1.part)

    # Cut009010006006006005005: cut Extrude136028
    add(extrude136028_2.part, mode=Mode.SUBTRACT)


solid = cut009010006006006005005_1.part
